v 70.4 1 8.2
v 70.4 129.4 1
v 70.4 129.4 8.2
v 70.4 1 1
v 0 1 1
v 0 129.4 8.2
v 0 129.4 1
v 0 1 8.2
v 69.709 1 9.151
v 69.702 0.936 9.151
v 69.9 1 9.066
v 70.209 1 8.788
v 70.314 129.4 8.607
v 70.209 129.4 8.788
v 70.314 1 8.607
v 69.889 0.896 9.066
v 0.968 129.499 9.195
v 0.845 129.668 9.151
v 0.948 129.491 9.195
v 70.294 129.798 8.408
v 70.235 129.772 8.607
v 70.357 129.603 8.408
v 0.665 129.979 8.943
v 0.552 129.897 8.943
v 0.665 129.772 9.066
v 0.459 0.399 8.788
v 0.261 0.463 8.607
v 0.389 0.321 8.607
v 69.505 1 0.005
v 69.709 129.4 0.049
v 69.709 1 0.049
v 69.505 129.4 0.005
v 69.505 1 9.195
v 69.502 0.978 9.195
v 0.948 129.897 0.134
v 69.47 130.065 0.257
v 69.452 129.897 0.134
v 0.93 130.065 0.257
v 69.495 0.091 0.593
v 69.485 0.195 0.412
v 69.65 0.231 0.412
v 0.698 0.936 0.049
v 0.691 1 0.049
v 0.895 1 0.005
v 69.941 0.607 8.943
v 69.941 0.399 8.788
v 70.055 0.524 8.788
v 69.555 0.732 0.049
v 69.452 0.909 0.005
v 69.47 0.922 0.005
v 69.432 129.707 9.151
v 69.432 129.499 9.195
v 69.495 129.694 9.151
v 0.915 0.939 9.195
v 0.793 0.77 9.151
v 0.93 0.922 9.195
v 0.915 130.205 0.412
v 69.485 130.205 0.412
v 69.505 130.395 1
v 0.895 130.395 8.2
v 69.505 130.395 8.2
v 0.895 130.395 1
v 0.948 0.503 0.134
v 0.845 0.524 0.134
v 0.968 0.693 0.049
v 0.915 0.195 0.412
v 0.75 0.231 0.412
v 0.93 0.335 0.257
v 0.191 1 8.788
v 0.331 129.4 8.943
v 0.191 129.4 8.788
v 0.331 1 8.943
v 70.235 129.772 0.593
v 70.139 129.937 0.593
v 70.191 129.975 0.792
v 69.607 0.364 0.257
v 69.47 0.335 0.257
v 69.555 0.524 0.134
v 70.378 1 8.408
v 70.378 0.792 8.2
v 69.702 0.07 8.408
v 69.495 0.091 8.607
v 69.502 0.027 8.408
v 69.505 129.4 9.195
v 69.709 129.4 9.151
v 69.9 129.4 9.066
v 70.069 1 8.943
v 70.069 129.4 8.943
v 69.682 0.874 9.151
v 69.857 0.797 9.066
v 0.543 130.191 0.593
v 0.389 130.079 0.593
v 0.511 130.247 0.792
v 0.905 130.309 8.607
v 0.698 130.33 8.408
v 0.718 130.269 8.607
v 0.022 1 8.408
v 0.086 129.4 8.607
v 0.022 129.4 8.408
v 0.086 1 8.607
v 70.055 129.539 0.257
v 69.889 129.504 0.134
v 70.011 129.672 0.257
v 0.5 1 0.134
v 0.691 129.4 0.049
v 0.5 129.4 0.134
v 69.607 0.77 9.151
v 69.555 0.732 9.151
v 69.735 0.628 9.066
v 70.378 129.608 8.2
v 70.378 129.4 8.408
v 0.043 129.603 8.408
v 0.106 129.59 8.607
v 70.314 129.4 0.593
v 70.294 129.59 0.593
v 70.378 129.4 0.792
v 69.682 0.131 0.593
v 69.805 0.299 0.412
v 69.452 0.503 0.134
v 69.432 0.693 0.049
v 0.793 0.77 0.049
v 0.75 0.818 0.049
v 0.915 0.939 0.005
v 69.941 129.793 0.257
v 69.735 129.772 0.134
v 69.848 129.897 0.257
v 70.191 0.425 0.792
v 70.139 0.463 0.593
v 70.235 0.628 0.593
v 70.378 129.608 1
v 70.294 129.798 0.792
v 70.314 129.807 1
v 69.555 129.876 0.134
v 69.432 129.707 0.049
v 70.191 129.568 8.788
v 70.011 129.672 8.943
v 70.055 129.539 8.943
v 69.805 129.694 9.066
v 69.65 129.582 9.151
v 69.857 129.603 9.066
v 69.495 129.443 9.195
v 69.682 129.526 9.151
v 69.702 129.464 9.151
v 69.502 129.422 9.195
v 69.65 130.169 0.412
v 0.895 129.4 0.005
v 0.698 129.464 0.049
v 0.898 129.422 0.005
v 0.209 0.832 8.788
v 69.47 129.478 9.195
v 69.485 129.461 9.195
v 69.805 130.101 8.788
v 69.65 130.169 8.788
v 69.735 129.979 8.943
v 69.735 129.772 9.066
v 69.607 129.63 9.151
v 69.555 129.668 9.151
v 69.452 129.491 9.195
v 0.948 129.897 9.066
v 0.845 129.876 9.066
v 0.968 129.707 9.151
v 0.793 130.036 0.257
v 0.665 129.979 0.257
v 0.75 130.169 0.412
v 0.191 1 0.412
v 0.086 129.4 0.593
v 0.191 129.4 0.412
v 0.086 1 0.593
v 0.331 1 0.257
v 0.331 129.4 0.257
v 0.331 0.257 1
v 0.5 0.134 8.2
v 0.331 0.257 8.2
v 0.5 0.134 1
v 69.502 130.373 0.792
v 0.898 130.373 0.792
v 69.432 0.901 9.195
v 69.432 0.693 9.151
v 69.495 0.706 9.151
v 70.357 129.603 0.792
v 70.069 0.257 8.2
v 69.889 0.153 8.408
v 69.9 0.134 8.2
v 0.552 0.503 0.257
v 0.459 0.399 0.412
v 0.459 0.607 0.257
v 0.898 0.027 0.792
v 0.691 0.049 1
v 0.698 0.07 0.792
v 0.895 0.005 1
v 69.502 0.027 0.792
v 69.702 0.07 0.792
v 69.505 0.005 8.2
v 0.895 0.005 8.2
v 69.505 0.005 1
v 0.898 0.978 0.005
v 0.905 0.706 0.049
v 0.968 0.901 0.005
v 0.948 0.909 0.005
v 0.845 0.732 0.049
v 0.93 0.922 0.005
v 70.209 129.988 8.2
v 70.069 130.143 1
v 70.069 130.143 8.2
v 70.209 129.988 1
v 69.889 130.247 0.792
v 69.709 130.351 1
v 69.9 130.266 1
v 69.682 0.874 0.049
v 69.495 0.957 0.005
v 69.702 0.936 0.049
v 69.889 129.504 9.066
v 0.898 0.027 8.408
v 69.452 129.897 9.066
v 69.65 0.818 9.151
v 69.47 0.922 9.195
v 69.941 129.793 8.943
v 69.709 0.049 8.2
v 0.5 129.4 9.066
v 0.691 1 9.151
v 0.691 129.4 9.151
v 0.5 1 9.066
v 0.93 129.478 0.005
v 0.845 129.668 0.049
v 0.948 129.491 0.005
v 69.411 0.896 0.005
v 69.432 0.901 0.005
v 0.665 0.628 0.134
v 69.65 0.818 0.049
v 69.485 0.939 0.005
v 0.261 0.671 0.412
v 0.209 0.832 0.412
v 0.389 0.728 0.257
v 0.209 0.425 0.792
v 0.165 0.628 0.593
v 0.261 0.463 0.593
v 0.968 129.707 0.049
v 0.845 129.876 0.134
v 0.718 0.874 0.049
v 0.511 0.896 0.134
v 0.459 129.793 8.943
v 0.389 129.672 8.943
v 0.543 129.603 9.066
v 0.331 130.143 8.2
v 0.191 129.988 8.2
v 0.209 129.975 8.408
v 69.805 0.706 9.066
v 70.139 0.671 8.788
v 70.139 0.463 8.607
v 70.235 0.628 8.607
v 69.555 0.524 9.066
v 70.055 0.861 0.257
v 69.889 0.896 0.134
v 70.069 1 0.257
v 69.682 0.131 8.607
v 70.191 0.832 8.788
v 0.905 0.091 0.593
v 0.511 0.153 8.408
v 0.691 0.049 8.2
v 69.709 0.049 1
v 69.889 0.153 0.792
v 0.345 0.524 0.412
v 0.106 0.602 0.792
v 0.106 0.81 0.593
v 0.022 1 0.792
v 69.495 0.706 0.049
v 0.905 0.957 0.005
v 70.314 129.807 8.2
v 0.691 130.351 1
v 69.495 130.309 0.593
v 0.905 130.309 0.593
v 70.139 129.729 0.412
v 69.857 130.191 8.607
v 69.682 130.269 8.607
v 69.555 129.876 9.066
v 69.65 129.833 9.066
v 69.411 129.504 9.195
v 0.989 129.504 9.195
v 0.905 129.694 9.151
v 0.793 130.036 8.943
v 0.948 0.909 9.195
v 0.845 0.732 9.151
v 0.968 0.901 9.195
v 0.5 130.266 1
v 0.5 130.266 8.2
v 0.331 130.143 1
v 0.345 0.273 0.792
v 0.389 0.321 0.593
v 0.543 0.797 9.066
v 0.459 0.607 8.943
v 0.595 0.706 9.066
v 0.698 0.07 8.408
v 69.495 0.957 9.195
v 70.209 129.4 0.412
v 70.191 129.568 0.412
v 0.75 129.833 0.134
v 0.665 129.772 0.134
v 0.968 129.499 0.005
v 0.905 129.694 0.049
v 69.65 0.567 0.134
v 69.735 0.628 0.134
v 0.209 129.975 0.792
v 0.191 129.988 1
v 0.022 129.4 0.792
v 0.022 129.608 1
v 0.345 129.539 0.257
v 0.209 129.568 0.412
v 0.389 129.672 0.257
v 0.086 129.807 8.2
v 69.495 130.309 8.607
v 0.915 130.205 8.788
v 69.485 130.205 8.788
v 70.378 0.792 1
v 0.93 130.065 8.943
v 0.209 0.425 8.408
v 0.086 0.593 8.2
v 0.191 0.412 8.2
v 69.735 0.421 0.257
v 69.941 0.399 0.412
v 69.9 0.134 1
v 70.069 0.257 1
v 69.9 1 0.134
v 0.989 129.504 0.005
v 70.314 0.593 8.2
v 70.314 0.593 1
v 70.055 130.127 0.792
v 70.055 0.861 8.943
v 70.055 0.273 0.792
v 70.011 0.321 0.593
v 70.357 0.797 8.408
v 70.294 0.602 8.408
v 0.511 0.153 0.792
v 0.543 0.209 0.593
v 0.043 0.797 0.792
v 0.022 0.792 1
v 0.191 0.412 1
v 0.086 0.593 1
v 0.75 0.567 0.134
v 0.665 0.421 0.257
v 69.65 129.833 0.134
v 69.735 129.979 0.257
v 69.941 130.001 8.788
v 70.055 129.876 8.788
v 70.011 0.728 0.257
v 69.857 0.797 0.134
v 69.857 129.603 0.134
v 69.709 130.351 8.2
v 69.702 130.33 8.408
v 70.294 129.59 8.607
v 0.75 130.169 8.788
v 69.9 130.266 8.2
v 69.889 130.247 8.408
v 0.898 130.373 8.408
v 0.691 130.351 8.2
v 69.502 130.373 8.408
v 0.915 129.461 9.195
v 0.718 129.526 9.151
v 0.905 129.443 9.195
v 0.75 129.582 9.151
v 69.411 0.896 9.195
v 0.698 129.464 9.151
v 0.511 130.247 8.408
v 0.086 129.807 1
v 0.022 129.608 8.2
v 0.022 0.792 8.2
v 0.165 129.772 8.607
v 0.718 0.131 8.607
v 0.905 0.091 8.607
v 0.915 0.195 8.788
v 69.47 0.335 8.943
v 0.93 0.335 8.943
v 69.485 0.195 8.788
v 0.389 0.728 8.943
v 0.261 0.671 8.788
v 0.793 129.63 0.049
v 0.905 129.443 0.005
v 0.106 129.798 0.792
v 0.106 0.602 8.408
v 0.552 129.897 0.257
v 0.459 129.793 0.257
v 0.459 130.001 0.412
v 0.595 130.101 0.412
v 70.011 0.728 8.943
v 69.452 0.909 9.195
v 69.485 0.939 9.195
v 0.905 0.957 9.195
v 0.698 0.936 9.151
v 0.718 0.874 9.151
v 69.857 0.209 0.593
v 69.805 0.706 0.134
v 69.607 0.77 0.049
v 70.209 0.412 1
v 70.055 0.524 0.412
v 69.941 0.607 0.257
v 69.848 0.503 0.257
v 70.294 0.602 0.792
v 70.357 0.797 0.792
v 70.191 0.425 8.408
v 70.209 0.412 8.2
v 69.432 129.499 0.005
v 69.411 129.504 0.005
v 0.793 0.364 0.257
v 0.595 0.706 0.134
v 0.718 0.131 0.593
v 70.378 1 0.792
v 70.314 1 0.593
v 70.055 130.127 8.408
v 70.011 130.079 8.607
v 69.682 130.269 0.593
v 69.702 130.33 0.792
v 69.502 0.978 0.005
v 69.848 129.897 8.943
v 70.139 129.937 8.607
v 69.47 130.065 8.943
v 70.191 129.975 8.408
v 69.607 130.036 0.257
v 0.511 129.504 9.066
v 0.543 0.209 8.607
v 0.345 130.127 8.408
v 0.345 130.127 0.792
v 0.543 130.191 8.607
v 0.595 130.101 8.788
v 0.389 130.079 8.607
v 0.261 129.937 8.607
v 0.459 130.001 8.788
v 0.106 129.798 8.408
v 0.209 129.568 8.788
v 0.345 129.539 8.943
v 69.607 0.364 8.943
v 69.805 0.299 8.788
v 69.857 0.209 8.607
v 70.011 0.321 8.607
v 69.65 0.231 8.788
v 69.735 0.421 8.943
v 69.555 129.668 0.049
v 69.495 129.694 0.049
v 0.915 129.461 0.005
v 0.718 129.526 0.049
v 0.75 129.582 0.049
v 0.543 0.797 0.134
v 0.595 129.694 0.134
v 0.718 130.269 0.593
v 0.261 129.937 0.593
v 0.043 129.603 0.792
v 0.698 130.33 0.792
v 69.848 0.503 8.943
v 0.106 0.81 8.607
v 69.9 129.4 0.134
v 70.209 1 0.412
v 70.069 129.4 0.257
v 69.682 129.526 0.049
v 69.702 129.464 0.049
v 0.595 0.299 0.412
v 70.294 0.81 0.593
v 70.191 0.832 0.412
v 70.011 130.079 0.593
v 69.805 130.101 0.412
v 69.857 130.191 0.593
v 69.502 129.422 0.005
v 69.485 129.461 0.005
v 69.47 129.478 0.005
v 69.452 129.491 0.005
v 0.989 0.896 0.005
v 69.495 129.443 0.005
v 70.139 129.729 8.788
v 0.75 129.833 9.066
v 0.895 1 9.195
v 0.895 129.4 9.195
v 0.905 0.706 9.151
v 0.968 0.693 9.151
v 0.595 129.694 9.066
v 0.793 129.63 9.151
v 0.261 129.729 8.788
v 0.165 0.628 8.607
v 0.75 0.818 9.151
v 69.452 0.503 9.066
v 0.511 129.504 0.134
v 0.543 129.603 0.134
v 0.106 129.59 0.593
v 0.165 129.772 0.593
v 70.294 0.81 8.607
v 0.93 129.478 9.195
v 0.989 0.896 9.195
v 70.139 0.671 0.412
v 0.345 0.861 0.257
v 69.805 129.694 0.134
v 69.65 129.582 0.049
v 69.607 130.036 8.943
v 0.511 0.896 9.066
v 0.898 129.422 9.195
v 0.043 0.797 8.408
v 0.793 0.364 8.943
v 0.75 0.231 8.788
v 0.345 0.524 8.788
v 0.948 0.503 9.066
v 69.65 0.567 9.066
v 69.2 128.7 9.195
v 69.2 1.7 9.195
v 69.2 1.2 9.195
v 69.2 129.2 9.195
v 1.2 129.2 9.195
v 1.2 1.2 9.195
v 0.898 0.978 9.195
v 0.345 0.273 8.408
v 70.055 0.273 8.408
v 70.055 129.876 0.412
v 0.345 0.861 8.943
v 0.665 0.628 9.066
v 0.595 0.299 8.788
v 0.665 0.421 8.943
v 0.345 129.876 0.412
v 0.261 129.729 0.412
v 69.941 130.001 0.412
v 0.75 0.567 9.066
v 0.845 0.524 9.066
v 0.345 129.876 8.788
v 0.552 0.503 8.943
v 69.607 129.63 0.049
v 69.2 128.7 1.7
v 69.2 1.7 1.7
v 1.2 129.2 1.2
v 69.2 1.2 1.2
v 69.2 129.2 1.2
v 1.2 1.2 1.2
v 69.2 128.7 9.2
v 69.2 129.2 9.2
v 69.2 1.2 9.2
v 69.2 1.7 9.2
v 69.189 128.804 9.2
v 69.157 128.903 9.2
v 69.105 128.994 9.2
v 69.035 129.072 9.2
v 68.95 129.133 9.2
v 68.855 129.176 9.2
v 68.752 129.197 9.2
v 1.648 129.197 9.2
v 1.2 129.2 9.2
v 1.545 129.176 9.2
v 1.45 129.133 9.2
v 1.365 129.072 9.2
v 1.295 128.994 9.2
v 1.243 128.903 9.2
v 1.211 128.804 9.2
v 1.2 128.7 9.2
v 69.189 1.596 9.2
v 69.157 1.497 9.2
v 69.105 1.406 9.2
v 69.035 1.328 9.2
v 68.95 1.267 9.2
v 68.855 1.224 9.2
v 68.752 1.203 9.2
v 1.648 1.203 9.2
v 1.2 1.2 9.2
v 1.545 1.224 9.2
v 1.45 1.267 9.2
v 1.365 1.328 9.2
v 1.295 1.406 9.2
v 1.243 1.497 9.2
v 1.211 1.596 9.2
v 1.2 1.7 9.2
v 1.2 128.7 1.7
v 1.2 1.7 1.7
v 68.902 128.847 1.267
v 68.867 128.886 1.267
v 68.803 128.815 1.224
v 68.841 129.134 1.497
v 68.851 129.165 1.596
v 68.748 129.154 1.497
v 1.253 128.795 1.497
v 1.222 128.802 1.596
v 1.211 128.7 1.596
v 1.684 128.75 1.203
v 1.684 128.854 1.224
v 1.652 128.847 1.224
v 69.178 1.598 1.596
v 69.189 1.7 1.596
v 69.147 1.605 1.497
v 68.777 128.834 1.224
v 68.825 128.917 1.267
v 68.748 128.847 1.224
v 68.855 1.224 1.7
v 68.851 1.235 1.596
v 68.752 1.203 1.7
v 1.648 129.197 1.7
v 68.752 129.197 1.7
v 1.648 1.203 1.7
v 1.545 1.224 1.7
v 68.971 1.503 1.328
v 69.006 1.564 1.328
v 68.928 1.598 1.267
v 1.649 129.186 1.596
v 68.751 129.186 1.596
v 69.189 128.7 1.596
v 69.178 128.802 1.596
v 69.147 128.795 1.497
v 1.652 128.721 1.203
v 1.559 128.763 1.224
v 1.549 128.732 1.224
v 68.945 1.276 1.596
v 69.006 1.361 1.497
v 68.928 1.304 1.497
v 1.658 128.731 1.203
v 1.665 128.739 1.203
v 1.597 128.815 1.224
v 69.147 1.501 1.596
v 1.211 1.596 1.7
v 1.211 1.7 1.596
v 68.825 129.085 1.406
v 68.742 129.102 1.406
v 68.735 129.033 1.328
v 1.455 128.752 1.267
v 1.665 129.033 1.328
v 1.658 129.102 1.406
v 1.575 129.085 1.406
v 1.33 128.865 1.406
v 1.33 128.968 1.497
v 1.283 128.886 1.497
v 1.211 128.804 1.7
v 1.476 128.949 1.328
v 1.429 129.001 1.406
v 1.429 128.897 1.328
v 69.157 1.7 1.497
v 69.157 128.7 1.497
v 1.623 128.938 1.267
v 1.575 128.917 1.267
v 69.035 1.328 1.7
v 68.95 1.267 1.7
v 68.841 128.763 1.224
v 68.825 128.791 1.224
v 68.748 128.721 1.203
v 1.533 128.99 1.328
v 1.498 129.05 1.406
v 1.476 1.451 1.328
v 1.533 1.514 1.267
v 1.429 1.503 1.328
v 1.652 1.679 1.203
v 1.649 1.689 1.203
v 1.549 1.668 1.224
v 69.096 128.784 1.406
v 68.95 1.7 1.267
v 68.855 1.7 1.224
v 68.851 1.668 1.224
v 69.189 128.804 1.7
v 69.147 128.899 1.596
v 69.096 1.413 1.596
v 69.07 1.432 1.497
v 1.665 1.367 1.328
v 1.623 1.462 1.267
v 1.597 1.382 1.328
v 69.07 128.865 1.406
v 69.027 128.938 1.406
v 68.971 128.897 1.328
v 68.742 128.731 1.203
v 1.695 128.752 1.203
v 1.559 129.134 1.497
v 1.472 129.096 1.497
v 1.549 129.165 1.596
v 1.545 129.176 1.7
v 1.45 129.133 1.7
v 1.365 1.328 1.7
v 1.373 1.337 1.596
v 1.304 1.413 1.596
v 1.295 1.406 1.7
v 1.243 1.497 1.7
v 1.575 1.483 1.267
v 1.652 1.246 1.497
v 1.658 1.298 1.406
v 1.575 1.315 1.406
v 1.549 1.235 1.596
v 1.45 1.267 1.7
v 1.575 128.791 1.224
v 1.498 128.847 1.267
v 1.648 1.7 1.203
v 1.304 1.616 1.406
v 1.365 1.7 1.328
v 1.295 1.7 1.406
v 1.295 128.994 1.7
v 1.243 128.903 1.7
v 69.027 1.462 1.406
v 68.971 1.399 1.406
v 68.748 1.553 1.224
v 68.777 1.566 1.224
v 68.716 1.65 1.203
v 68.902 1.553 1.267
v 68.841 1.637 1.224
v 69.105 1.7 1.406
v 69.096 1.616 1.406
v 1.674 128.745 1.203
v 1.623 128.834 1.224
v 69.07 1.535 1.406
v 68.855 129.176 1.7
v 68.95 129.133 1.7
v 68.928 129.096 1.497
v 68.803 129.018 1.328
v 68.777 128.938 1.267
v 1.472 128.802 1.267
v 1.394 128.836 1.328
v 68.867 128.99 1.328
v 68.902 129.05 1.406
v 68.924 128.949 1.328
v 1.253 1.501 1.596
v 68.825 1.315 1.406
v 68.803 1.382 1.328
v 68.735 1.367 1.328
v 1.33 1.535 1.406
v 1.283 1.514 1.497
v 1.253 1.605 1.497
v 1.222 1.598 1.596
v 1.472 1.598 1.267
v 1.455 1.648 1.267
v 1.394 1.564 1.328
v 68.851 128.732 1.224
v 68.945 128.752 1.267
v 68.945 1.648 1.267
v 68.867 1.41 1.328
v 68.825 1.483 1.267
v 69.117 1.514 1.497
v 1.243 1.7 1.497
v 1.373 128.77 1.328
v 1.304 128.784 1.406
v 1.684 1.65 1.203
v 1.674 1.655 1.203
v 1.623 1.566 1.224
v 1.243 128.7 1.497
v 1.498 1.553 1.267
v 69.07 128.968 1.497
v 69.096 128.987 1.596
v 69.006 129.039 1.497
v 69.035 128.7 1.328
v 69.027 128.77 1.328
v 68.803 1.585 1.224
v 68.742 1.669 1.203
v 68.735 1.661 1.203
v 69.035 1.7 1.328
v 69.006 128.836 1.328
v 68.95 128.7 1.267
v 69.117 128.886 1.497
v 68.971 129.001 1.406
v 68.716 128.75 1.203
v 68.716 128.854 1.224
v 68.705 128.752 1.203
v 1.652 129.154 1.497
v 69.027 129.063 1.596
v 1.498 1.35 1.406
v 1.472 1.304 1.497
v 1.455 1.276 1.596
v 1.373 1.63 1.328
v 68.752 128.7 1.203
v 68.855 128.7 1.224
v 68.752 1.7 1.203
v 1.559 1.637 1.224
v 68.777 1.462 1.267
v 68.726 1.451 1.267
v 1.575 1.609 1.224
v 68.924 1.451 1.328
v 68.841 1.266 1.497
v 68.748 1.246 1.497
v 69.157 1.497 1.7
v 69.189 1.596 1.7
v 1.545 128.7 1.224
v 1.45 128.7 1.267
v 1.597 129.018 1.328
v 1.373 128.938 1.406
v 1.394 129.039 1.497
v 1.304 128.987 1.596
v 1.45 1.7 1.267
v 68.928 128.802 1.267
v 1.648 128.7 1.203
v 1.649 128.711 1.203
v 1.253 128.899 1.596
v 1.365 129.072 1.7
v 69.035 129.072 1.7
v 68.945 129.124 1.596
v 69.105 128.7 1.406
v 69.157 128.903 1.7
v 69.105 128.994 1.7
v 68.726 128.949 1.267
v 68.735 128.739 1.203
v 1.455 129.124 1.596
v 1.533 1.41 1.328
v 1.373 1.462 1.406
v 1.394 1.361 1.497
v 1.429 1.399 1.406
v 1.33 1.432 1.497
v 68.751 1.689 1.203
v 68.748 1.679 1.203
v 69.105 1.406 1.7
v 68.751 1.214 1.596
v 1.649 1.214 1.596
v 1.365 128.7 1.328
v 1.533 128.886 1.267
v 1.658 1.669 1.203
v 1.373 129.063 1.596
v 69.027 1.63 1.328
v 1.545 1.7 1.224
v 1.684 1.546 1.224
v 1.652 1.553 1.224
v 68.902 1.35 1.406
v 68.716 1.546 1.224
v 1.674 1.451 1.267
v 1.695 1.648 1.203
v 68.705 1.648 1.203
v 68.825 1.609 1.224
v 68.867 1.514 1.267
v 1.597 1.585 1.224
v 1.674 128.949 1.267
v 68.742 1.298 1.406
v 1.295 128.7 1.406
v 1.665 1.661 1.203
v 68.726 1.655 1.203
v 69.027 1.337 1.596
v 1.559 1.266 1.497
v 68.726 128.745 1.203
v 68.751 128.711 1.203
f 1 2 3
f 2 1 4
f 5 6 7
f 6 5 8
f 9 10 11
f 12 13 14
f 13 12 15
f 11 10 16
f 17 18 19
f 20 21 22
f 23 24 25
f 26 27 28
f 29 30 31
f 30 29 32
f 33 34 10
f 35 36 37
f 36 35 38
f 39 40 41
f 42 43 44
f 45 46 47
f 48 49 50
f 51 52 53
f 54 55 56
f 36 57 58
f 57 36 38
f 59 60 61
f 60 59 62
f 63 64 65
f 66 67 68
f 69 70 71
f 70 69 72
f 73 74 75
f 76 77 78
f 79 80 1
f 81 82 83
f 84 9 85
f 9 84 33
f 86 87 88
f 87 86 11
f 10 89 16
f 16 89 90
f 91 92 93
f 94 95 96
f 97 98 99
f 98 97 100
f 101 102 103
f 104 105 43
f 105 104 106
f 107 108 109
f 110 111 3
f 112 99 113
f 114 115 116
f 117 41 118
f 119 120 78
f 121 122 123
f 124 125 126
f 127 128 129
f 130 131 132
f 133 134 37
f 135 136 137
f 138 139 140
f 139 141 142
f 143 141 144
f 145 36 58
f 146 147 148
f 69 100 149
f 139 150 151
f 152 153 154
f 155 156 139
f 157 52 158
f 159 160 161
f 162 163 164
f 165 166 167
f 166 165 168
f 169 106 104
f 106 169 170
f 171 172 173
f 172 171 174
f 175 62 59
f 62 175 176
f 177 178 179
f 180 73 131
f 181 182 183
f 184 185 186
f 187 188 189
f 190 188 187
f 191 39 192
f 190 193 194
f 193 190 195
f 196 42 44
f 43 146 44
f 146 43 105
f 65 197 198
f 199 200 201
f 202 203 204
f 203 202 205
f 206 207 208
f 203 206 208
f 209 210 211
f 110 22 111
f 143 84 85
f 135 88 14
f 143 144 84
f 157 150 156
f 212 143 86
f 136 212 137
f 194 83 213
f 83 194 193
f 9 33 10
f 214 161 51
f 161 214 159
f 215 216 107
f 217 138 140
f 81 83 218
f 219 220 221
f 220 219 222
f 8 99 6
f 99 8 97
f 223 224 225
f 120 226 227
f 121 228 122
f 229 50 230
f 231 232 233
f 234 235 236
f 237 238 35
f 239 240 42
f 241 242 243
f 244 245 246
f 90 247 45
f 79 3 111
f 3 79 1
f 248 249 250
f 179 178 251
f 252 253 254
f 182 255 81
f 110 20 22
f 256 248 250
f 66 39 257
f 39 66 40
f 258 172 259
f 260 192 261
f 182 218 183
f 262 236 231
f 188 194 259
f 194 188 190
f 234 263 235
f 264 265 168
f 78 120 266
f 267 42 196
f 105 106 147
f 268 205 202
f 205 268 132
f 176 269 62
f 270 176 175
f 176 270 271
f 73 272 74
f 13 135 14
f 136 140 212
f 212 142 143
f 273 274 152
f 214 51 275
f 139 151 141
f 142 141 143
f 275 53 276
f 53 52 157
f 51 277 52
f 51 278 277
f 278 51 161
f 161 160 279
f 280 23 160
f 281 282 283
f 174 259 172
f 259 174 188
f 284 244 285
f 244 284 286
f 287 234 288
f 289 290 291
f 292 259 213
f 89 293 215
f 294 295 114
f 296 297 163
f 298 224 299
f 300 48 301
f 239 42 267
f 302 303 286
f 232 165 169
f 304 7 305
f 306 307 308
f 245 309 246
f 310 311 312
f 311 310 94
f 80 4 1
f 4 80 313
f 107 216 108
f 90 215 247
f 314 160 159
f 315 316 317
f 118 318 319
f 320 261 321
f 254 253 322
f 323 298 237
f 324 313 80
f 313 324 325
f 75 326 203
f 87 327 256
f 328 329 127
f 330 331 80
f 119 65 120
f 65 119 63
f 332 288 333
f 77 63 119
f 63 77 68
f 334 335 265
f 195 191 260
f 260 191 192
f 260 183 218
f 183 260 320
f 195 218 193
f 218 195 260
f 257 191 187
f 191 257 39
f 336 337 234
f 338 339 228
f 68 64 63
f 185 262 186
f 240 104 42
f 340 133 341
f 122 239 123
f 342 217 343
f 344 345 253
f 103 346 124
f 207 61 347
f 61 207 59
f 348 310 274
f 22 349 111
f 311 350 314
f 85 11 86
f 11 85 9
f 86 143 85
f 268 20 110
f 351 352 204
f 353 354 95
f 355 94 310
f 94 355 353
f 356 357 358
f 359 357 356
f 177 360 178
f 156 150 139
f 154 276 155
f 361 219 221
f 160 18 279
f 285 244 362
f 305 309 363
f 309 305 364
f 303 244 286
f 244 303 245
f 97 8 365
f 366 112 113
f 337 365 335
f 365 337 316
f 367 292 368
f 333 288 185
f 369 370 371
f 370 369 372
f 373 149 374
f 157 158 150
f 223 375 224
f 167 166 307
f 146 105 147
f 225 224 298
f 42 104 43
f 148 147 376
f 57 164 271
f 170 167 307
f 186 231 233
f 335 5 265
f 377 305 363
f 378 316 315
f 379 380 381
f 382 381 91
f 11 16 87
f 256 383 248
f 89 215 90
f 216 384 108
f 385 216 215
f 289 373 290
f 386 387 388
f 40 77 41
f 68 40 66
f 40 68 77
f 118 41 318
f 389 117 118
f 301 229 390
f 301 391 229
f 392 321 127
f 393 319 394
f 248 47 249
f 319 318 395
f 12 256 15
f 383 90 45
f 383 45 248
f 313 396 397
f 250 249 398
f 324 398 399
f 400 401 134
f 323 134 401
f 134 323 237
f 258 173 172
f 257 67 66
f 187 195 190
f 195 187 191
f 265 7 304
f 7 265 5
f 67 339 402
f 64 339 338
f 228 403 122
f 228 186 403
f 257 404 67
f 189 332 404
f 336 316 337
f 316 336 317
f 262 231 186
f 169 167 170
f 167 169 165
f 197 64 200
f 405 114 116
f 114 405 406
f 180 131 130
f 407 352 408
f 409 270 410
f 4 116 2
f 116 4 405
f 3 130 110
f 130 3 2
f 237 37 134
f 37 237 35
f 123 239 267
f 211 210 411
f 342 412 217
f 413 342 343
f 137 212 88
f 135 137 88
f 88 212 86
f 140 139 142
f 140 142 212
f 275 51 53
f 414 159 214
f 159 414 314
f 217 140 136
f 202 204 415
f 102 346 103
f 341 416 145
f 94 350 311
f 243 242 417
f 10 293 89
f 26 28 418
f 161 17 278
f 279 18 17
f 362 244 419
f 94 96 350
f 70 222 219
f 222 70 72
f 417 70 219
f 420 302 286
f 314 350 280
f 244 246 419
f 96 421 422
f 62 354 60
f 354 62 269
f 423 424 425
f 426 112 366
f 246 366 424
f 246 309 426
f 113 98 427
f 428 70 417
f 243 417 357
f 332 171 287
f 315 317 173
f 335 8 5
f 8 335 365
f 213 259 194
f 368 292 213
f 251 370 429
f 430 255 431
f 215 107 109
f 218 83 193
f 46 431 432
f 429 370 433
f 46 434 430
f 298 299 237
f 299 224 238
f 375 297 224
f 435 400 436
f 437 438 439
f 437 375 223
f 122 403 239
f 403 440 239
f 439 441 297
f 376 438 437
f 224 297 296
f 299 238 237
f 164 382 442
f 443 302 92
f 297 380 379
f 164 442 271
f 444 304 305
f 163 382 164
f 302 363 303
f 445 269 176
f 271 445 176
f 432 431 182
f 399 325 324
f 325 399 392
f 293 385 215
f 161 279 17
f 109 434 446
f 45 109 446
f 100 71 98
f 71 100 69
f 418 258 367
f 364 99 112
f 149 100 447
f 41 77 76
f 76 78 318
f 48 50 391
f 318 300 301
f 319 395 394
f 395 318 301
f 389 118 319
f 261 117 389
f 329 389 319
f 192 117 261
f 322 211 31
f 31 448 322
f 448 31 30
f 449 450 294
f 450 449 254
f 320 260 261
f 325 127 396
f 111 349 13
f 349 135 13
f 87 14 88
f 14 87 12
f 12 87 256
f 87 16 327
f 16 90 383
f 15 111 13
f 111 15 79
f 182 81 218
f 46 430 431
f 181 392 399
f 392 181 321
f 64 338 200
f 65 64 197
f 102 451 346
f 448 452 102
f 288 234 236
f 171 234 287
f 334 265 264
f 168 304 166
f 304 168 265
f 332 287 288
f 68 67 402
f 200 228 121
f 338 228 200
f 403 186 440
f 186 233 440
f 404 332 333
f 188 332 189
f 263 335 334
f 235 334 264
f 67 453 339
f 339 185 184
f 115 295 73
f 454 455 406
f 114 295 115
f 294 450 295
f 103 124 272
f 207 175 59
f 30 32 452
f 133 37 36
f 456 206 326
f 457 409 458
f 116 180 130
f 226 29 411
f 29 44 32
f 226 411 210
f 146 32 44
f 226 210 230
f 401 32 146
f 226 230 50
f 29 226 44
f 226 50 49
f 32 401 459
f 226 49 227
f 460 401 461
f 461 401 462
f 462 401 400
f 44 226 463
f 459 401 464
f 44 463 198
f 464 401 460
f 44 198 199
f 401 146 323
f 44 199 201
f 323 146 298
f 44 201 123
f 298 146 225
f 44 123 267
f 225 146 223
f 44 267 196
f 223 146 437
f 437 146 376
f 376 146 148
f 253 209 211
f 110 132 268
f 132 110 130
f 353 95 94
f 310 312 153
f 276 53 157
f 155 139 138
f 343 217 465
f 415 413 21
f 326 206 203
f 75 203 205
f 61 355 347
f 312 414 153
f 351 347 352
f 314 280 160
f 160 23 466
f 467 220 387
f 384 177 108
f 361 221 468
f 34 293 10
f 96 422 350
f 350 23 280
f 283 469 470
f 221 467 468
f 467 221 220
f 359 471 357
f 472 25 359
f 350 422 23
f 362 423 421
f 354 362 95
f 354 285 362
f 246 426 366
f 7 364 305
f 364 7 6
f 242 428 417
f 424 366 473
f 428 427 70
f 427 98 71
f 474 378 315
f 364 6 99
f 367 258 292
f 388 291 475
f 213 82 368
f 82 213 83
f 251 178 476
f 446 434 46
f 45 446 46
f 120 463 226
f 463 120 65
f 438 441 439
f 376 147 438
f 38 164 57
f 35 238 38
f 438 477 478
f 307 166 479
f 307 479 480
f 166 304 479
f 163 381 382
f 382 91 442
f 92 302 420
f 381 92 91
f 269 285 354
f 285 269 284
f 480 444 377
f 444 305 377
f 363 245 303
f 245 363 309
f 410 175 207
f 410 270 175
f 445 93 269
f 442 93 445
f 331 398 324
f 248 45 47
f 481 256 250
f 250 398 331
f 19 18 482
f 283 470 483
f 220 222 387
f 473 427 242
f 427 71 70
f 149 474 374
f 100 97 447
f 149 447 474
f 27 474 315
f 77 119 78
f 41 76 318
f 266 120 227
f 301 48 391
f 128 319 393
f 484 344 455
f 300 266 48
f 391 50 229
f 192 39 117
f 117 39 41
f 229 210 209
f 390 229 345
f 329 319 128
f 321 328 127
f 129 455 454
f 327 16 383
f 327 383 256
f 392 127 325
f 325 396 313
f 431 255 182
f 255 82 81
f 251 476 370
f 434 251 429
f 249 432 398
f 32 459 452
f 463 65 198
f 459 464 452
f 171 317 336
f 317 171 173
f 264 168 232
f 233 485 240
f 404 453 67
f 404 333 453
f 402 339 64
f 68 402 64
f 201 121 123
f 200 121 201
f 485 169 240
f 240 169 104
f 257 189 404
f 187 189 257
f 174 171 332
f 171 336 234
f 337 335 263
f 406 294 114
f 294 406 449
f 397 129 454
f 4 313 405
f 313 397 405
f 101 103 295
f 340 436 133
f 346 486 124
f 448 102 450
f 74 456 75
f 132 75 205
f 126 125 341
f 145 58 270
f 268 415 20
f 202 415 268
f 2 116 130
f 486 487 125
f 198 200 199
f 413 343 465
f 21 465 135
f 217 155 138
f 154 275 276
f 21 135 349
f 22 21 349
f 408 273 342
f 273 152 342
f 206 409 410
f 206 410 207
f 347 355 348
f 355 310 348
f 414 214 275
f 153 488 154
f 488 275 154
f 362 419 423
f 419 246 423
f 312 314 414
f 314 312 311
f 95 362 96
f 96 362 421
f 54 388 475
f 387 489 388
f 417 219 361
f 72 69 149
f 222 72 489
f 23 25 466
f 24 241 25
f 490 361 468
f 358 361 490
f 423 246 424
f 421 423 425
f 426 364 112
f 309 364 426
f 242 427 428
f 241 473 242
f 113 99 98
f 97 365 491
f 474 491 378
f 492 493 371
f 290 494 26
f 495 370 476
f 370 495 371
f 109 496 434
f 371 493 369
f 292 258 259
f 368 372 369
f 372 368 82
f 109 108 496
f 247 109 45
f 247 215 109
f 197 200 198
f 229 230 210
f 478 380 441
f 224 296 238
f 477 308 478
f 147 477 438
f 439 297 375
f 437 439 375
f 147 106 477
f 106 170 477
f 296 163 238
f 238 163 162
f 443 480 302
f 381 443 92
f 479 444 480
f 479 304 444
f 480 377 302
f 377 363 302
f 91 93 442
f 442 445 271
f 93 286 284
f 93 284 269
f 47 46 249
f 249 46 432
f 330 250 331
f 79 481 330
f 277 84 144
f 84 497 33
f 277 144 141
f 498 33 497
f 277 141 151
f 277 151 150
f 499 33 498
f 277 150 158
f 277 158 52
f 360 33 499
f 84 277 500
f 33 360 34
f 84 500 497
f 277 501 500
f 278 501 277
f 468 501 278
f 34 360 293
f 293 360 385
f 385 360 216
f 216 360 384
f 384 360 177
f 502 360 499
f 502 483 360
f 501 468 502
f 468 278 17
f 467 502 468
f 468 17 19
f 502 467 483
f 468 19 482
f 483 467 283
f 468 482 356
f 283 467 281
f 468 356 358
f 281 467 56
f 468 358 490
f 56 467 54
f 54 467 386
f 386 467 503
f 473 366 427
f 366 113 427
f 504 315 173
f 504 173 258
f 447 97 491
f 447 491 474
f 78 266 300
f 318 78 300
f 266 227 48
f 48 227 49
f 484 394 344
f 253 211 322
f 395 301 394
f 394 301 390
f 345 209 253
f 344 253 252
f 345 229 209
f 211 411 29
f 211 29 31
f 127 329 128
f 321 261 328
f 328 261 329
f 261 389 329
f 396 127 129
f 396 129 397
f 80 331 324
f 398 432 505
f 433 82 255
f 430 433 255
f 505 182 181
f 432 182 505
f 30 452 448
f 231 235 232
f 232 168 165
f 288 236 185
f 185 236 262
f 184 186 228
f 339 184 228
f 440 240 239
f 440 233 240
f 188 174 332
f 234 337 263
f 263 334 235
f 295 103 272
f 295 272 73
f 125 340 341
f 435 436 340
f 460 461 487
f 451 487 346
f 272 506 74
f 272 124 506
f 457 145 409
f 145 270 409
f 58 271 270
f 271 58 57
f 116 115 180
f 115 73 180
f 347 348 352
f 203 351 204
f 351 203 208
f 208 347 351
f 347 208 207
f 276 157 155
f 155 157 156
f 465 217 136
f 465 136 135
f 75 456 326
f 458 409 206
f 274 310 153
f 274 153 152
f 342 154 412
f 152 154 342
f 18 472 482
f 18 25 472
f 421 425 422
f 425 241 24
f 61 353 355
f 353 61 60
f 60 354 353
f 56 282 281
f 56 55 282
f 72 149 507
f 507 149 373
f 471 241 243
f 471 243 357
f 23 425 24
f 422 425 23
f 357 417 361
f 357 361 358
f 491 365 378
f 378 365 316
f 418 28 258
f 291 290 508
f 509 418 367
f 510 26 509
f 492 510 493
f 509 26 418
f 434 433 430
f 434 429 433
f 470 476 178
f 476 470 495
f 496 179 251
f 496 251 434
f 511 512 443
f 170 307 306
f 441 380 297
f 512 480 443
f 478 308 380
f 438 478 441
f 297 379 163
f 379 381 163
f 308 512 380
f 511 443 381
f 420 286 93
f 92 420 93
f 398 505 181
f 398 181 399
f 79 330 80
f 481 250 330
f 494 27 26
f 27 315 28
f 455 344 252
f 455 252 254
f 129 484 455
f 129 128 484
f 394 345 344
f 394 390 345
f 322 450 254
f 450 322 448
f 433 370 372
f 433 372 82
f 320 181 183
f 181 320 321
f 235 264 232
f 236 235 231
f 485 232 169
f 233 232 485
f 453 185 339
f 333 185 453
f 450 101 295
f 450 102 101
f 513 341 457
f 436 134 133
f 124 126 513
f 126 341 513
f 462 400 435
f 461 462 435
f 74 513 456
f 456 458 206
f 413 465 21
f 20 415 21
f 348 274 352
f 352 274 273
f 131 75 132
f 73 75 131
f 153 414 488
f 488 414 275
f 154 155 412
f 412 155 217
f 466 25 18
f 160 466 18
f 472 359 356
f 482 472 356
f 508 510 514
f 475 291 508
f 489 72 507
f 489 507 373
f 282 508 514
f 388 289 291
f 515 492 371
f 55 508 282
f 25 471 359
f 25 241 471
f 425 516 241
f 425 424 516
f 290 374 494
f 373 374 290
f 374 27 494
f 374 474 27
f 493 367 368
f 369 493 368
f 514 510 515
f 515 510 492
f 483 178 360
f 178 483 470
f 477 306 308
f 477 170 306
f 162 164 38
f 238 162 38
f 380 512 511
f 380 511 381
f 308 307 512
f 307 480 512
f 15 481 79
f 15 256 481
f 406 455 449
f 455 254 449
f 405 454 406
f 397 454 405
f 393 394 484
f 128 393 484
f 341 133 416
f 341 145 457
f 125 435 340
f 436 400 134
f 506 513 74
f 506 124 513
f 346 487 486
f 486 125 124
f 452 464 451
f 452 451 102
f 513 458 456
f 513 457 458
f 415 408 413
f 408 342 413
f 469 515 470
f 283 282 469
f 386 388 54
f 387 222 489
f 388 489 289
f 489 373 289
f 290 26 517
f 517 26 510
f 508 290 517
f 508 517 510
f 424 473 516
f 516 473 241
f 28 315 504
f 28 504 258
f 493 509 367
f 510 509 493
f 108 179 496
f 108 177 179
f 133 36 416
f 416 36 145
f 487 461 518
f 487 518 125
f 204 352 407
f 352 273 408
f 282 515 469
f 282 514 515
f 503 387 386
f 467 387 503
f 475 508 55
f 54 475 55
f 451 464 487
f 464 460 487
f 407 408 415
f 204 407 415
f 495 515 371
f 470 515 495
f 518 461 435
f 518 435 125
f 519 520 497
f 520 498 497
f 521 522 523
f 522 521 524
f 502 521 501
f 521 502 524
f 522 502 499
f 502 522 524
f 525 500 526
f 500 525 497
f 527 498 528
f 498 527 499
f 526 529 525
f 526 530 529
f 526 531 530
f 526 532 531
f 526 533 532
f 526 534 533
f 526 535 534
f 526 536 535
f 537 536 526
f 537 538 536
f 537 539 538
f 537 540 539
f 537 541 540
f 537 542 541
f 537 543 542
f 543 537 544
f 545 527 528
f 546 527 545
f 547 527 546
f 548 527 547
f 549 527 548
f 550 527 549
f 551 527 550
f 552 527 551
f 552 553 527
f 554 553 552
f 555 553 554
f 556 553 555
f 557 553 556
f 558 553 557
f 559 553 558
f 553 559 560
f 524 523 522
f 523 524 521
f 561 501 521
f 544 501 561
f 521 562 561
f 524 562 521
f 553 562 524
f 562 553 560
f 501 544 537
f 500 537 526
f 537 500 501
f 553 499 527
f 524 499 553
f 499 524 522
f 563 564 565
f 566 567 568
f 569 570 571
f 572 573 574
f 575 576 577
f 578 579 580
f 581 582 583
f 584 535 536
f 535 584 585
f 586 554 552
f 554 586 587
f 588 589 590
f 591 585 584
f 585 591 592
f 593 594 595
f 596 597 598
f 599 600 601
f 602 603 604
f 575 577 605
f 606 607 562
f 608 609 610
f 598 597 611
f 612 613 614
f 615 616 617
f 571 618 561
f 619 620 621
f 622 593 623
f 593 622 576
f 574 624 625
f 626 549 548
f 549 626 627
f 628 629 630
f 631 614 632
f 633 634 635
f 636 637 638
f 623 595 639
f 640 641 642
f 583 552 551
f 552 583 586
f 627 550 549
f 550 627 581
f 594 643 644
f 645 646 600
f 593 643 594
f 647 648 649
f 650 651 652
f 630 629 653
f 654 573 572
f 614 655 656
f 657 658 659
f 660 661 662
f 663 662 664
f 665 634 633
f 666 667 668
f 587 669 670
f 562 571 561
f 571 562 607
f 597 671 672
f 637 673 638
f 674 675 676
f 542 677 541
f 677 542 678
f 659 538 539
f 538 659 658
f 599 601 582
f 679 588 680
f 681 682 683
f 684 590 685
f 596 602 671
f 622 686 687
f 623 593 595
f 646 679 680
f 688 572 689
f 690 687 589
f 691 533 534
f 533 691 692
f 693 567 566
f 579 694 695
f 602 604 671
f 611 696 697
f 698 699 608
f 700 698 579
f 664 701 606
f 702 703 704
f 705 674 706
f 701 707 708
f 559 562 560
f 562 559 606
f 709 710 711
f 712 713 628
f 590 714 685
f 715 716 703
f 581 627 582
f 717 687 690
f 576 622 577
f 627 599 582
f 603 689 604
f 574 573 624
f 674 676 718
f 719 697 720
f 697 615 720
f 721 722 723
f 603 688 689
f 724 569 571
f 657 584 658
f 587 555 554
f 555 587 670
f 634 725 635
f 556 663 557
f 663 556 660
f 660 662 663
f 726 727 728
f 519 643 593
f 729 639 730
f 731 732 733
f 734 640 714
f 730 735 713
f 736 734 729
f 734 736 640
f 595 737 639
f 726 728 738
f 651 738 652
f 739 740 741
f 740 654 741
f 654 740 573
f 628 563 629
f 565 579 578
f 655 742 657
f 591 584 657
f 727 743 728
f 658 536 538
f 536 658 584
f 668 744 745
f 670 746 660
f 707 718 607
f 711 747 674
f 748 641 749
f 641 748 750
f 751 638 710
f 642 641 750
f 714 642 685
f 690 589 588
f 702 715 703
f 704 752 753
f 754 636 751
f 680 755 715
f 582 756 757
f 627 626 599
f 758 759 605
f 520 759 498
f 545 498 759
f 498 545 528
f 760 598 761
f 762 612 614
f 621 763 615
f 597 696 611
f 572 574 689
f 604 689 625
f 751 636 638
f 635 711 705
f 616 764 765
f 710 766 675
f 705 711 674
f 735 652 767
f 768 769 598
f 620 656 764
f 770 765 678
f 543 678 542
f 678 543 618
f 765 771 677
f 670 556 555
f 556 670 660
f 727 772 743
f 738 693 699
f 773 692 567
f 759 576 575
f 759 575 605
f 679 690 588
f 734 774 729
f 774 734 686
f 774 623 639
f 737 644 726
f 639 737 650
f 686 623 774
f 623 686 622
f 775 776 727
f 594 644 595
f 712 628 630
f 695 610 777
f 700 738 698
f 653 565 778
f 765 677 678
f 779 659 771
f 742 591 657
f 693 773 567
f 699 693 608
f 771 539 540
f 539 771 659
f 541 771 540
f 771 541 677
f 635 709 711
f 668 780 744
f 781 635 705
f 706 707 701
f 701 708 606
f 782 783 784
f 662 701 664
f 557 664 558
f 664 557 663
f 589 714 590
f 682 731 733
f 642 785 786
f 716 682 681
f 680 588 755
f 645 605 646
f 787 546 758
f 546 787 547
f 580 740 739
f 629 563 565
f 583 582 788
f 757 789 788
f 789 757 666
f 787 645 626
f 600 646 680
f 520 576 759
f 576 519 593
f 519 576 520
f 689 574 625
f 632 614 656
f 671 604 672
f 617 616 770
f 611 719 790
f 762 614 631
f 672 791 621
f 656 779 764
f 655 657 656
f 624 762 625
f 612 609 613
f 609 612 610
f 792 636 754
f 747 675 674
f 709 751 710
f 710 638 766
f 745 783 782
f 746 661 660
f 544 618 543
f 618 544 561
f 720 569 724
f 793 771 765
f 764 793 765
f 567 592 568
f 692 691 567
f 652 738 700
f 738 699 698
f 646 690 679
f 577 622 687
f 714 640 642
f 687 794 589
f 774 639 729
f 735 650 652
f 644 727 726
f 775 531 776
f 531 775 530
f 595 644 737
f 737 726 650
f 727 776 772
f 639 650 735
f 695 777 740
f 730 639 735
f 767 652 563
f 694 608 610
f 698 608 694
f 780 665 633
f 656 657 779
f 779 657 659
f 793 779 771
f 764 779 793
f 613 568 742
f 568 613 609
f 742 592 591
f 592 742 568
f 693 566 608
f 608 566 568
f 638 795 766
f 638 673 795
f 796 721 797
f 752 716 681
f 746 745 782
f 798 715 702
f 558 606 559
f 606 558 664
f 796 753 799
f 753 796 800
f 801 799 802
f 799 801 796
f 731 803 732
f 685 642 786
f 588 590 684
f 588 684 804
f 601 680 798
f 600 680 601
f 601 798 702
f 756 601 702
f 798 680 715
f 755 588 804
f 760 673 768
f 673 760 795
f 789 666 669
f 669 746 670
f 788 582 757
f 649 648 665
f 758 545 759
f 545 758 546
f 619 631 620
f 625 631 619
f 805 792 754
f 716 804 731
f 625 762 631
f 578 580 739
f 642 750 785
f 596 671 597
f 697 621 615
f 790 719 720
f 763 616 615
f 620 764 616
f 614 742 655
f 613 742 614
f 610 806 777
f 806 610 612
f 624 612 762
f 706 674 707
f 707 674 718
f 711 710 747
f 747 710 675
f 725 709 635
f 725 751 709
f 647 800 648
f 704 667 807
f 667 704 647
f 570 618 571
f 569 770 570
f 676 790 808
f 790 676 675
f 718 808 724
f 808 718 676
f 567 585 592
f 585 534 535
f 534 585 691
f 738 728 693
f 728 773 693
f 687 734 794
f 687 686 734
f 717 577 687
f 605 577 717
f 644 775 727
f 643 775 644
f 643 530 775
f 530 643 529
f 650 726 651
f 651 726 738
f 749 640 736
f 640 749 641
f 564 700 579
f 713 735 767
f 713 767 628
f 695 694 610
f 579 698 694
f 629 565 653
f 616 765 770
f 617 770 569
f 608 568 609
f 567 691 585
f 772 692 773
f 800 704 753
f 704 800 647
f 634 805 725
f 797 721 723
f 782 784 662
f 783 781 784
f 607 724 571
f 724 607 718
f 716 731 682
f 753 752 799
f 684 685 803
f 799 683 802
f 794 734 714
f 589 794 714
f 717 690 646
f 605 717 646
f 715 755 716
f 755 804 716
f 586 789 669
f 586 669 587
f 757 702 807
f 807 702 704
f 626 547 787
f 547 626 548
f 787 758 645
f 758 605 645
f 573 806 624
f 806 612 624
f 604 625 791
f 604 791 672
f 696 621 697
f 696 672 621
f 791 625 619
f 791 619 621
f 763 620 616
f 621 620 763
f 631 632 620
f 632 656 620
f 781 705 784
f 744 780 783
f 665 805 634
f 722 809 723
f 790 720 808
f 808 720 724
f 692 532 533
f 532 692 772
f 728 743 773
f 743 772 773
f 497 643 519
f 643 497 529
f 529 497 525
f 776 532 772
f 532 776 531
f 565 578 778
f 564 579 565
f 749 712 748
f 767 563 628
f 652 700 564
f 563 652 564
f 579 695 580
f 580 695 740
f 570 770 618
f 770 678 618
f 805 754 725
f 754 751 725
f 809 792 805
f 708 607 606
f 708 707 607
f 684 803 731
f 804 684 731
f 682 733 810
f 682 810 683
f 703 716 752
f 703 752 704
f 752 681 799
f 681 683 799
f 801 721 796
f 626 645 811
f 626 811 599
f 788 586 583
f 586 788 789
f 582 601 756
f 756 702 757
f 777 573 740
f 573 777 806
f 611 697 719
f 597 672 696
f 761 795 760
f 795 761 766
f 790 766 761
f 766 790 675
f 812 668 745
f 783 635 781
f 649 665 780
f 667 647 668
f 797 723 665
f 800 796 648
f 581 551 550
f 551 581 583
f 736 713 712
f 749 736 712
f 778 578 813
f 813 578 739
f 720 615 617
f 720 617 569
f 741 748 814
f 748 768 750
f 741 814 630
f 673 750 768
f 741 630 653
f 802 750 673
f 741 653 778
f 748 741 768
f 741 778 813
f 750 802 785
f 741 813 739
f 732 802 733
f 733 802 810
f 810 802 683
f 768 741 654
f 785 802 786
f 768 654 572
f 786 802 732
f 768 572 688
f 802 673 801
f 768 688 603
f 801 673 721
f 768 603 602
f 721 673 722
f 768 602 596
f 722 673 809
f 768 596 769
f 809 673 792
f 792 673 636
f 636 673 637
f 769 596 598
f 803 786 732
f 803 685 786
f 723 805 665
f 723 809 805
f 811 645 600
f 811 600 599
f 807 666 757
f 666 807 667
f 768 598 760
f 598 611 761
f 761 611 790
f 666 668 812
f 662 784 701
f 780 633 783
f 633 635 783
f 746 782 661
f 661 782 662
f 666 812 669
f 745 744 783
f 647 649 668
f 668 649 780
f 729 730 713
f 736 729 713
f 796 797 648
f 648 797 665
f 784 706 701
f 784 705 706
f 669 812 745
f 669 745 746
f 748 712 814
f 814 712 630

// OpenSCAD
// Download both files into the same directory and make a copy of this template for each project. Adjust the variables and values as needed to override the defaults in this file as needed. In this way you can replace the `Ultimate_Box_Generator.scad` file with a new version without having to track and restore your changes.

// If you want to use any framework variables in calulations you must import them here. If you want to also change the variable you must use a second line below to do that.
//wall=wall;
//internal_wall=internal_wall;

// Include the framework. You can change the prefix to load from a shared path.
include    <Ultimate_Box_Generator.scad>;

// At this point you can start to adjust builtin varaibles and create your own. There are also some examples of more complex boxes at the end of the file.


// Parts to render. To do more complex opperations disable these and manually call make_box() and make_lid() instead.
show_box=false;	// Whether or not to render the box
show_lid=false;	// Whether or not to render the lid. To make open boxes with no lid set `show_lid=false` and `lid_type=5`.
lid_type=0; 

// General Settings
// comp_size_deep = 18; // Depth of compartments
// comp_size_x = 32;	 // Size of compartments, X
// comp_size_y = 24.6;	 // Size of compartments, Y
wall = 1.2;		    // Width of wall, see `internal_wall` below for alternate inner wall size.
internal_wall=0.8;
// repeat_x = 3;		// Number of compartments, X
// repeat_y = 2;		// Number of compartments, Y
//tolerance=.15;      // Tolerance around lid.  If it's too tight, increase this. If it's too loose, decrease it.

// Box Rounding
box_corner_radius=1; // Add a rounding affect to the corners of the box. Anything over `wall` will cause structure and lid problems.
internal_corner_radius=.5; // Add a rounding affect to the inside.
//mesh_corner_radius=0; // Leave a radius around each corner of the mesh. May hep with bridges.
//corner_fn=30;

// Supress individual walls.
//supress_walls_x=[]; // These are the walls running along the X axis. It should be an array of size [repeat_y-1][repeat_x].
//supress_walls_y=[]; // These are the walls running along the Y axis. It should be an array of size [repeat_x-1][repeat_y].
// Example for repeat_x=4, repeat_y=3:
//supress_walls_x=[[1,1]];
//supress_walls_y=[[1,0,1],[0,1,1],[1,1,1]];
//supress_sides=false; // [X, Y, X, Y] Cutout/supress some sides. this may behave baddly with compartments or mesh.
//supress_sides_radius=wall; // Add a rounding to the cutout.
//supress_sides_offset=0; // 0, wall, [X, Y, Z] adjsut the coutout in all directions. + to grow, - so shrink
//supress_sides_fn=30;

//Internal Structure (You may need to turn off `mesh_do_sides` or `mesh_do_bottom` for good results.)
// You can also use `make_wall()` to manually add your own walls.
// 1: Rounded bottom frame.
// 2: Hexagon bottom frame. (To make this shape perfect set `comp_size_deep` to the width between to edges of the tile and set `comp_size_x` or `comp_size_y` to this this: `comp_size_deep / sqrt(3)*2`.
// 3: Rough bottom to make bits sit unevenly. (Partial)
// 4: Vertical rounding on corner. Set `internal_size_deep` to `comp_size_deep` and `internal_size_circle` to the shortest `comp_size` for a circle.
// 5: Vertical hexegon. Results may varry.
//internal_type=0; // Internal structure, see above.
//internal_rotate=false; // On lid axis or rotate to opposite.
//internal_size_deep=comp_size_deep/2; // How far into the box to start the internal structure. Should be `comp_size_deep/2` for type 1-2, `wall` for 3, or comp_size_deep for type 4-5.
//internal_size_circle=internal_type==1 ? internal_size_deep : internal_size_deep * 2 / sqrt(3); // Use this calculation, or the shorter comp_size for type 4-5.
//internal_fn=internal_type==1 || internal_type==4 ? 60 : 6; // Complexity of internal curves, may need to increase for larger or smoother curves.
//internal_wall=wall; // Custom size for internal walls.


// Complex Structure
//make_complex_box=false; // Use an array of objects from `complex_box` to create many smaller boxes within the larger box.
//internal_grow_down=true; // If set compartments will be extruded into the larger box from the top to make a flush surface. (May make a model that uses a lot of material.
//internal_empty_bottom=false; // If set the area blow each box will be empty. This will not be printable on a FDM printer unless supports are included internally but still may save material and print time.



// In addition you can set `show_box=false;` and then call `make_box()` manually to join and remove more structure to it like in this example.
/*show_box=false;
difference() {
    make_box();
    translate([0, comp_size_y/2 + wall, 0])
    rotate([0, 90, 0])
    cylinder(comp_size_x +wall*2, 10, 10);
}*/

// You can also use calls to `make_internal_box` to create more complex boxes within a larger box that share a single lid.
/*show_box=false;
make_box();
intersection() {     
    faction_x=10; faction_y=comp_size_y; faction_z=5; faction_repeat_x=3; faction_repeat_y=1;
    faction_size_x=calc_size(faction_repeat_x, faction_x, wall=internal_wall, internal_wall=internal_wall);
faction_size_y=calc_size(faction_repeat_y, faction_y, wall=internal_wall, internal_wall=internal_wall);
    
    translate([wall, wall, wall])
    cube([faction_size_x - wall, faction_size_y - wall*2, comp_size_deep]);
            
    translate([wall-internal_wall, wall-internal_wall, wall-internal_wall])
    union() {
        translate([0, 0, 0])
        make_internal_box(faction_x, faction_y, faction_z, wall=internal_wall, repeat_x=faction_repeat_x, repeat_y=faction_repeat_y);
    }
}*/

// This exmaple wil make a complex series of boxes in a larger container. The object's can be used to position other oebjects and create internal structure.
comp_size_x = 92-(2*12); // external size add 2*wall to this
comp_size_y = 2*64;    // external width add 2*wall to this
comp_size_deep = 8; // external height add 2*wall to thist

// internal_wall=0.8;
// make the external box with no internal curves
make_box(internal_type=0);
internal_type=1;
internal_size_deep=comp_size_deep  ;
comp2=make_object( x=32.2, y=31.6, z=20, offset_x=90, offset_y=0, repeat_x=3, repeat_y=2, color="Blue");

complex_box=[
   comp2   
];
// make the internal compartments
make_complex_box();

// Some notes on complex prints:
/* OpenSCAD experience is required to do pretty much any type of customization or complex opperations. This will essentialy just make the containers within one larger object with a single lid. Alternatly multiple boxes could be created and joined together with translations to make a larger object with multiple lids. 
   Due to how variables are passed in OpenSCAD it can be tricky to get the parameters set on the parent box and child boxes as you want. It is best to use global variable assignmets to set the child box parameters, then pass overrides to the `make_box()` call yourself. (You have to set `show_box=false;` if you do this.)
  */
